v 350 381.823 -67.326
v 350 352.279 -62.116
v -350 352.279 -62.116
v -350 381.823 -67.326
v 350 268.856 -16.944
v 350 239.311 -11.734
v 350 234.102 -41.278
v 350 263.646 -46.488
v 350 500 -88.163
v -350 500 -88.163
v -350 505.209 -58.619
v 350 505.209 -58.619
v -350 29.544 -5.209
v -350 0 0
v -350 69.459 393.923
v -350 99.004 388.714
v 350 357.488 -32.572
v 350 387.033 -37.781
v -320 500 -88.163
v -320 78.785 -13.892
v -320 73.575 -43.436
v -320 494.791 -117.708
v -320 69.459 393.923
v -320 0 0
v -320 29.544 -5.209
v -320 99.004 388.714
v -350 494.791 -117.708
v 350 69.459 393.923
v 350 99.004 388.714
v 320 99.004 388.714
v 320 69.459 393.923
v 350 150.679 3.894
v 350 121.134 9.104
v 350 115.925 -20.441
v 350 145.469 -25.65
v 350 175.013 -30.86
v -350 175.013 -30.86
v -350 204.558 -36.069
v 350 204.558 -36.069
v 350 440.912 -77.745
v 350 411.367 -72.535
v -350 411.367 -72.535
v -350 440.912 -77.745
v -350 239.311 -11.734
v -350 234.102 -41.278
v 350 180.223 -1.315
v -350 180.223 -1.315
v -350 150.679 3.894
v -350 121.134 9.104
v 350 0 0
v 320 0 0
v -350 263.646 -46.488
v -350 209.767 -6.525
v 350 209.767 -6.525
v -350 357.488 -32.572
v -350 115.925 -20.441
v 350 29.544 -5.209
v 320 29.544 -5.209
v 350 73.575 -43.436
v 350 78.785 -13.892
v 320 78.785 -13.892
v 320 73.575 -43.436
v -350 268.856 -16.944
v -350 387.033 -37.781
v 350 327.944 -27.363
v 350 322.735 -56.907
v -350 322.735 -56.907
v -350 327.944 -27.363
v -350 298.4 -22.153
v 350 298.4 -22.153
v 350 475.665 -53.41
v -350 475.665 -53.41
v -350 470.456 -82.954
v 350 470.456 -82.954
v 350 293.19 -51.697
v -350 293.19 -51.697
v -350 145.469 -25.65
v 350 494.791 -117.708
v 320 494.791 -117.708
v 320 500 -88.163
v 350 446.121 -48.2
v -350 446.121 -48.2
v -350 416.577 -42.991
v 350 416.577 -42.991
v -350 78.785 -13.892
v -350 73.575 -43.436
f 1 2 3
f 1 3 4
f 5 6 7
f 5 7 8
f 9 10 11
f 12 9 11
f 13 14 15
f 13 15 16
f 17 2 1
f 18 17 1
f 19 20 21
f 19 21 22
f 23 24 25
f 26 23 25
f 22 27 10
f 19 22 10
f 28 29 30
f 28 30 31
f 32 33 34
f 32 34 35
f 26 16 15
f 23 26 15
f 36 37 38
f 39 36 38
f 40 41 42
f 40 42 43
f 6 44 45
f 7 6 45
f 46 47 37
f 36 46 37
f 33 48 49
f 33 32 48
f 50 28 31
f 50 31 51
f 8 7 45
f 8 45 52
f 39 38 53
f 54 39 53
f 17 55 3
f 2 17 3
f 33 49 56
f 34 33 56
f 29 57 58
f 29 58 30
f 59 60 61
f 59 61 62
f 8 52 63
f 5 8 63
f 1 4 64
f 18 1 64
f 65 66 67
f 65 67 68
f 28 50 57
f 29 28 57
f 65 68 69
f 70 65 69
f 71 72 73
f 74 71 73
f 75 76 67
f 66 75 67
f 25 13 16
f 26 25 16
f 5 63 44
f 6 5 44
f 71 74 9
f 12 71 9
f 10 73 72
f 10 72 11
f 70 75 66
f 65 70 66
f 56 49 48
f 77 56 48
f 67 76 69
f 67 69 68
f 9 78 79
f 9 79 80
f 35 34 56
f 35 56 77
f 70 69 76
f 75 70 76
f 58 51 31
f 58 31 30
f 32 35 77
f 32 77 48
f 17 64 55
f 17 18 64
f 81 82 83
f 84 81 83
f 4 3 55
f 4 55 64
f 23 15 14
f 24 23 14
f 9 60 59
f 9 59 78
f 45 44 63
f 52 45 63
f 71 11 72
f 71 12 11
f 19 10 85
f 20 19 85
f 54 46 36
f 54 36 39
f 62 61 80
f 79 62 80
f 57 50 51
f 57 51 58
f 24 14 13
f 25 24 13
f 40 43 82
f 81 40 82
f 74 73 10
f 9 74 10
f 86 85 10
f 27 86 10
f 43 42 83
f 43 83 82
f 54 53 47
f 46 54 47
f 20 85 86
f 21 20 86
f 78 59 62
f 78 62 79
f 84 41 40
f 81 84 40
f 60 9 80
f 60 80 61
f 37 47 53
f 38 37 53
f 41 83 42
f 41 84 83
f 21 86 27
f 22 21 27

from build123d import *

# Parameters (mm, degrees)
F5_DEPTH      = 30
F6_DEPTH      = 30
F8_DEPTH      = 350
F8_DEPTH_BACK = 350


with BuildPart() as f5:
    # F4 (on offset) → F5 (new body)
    with BuildSketch(Plane.YZ.offset(-350)):
        Polygon((500, -88.16349), (78.78462, -13.891854), (73.575175, -43.436087), (494.790555, -117.707723), align=None)
        Polygon((69.459271, 393.923101), (0, 0), (29.544233, -5.209445), (99.003504, 388.713656), align=None)
    extrude(amount=F5_DEPTH)


with BuildPart() as f6:
    # F3 (on offset) → F6 (new body)
    with BuildSketch(Plane.YZ.offset(350)):
        Polygon((69.459271, 393.923101), (0, 0), (29.544233, -5.209445), (99.003504, 388.713656), align=None)
        Polygon((500, -88.16349), (78.78462, -13.891854), (73.575175, -43.436087), (494.790555, -117.707723), align=None)
    extrude(amount=-F6_DEPTH)


with BuildPart() as f8:
    # F7 (on Right) → F8 (new body, two sides)
    with BuildSketch(Plane.YZ) as f8_sk:
        Polygon((475.665213, -53.409812), (470.455767, -82.954045), (500, -88.16349), (505.209445, -58.619258), align=None)
        Polygon((416.576748, -42.990922), (411.367302, -72.535154), (440.911535, -77.7446), (446.12098, -48.200367), align=None)
        Polygon((357.488282, -32.572031), (352.278837, -62.116264), (381.82307, -67.325709), (387.032515, -37.781476), align=None)
        Polygon((298.399817, -22.15314), (293.190372, -51.697373), (322.734604, -56.906818), (327.94405, -27.362586), align=None)
        Polygon((239.311352, -11.73425), (234.101907, -41.278482), (263.646139, -46.487928), (268.855585, -16.943695), align=None)
        Polygon((180.222887, -1.315359), (175.013442, -30.859592), (204.557674, -36.069037), (209.767119, -6.524804), align=None)
        Polygon((121.134422, 9.103532), (115.924976, -20.440701), (145.469209, -25.650146), (150.678654, 3.894086), align=None)
    extrude(amount=F8_DEPTH)
    extrude(f8_sk.sketch, amount=-F8_DEPTH_BACK)


solid = Compound([f5.part, f6.part, f8.part])
